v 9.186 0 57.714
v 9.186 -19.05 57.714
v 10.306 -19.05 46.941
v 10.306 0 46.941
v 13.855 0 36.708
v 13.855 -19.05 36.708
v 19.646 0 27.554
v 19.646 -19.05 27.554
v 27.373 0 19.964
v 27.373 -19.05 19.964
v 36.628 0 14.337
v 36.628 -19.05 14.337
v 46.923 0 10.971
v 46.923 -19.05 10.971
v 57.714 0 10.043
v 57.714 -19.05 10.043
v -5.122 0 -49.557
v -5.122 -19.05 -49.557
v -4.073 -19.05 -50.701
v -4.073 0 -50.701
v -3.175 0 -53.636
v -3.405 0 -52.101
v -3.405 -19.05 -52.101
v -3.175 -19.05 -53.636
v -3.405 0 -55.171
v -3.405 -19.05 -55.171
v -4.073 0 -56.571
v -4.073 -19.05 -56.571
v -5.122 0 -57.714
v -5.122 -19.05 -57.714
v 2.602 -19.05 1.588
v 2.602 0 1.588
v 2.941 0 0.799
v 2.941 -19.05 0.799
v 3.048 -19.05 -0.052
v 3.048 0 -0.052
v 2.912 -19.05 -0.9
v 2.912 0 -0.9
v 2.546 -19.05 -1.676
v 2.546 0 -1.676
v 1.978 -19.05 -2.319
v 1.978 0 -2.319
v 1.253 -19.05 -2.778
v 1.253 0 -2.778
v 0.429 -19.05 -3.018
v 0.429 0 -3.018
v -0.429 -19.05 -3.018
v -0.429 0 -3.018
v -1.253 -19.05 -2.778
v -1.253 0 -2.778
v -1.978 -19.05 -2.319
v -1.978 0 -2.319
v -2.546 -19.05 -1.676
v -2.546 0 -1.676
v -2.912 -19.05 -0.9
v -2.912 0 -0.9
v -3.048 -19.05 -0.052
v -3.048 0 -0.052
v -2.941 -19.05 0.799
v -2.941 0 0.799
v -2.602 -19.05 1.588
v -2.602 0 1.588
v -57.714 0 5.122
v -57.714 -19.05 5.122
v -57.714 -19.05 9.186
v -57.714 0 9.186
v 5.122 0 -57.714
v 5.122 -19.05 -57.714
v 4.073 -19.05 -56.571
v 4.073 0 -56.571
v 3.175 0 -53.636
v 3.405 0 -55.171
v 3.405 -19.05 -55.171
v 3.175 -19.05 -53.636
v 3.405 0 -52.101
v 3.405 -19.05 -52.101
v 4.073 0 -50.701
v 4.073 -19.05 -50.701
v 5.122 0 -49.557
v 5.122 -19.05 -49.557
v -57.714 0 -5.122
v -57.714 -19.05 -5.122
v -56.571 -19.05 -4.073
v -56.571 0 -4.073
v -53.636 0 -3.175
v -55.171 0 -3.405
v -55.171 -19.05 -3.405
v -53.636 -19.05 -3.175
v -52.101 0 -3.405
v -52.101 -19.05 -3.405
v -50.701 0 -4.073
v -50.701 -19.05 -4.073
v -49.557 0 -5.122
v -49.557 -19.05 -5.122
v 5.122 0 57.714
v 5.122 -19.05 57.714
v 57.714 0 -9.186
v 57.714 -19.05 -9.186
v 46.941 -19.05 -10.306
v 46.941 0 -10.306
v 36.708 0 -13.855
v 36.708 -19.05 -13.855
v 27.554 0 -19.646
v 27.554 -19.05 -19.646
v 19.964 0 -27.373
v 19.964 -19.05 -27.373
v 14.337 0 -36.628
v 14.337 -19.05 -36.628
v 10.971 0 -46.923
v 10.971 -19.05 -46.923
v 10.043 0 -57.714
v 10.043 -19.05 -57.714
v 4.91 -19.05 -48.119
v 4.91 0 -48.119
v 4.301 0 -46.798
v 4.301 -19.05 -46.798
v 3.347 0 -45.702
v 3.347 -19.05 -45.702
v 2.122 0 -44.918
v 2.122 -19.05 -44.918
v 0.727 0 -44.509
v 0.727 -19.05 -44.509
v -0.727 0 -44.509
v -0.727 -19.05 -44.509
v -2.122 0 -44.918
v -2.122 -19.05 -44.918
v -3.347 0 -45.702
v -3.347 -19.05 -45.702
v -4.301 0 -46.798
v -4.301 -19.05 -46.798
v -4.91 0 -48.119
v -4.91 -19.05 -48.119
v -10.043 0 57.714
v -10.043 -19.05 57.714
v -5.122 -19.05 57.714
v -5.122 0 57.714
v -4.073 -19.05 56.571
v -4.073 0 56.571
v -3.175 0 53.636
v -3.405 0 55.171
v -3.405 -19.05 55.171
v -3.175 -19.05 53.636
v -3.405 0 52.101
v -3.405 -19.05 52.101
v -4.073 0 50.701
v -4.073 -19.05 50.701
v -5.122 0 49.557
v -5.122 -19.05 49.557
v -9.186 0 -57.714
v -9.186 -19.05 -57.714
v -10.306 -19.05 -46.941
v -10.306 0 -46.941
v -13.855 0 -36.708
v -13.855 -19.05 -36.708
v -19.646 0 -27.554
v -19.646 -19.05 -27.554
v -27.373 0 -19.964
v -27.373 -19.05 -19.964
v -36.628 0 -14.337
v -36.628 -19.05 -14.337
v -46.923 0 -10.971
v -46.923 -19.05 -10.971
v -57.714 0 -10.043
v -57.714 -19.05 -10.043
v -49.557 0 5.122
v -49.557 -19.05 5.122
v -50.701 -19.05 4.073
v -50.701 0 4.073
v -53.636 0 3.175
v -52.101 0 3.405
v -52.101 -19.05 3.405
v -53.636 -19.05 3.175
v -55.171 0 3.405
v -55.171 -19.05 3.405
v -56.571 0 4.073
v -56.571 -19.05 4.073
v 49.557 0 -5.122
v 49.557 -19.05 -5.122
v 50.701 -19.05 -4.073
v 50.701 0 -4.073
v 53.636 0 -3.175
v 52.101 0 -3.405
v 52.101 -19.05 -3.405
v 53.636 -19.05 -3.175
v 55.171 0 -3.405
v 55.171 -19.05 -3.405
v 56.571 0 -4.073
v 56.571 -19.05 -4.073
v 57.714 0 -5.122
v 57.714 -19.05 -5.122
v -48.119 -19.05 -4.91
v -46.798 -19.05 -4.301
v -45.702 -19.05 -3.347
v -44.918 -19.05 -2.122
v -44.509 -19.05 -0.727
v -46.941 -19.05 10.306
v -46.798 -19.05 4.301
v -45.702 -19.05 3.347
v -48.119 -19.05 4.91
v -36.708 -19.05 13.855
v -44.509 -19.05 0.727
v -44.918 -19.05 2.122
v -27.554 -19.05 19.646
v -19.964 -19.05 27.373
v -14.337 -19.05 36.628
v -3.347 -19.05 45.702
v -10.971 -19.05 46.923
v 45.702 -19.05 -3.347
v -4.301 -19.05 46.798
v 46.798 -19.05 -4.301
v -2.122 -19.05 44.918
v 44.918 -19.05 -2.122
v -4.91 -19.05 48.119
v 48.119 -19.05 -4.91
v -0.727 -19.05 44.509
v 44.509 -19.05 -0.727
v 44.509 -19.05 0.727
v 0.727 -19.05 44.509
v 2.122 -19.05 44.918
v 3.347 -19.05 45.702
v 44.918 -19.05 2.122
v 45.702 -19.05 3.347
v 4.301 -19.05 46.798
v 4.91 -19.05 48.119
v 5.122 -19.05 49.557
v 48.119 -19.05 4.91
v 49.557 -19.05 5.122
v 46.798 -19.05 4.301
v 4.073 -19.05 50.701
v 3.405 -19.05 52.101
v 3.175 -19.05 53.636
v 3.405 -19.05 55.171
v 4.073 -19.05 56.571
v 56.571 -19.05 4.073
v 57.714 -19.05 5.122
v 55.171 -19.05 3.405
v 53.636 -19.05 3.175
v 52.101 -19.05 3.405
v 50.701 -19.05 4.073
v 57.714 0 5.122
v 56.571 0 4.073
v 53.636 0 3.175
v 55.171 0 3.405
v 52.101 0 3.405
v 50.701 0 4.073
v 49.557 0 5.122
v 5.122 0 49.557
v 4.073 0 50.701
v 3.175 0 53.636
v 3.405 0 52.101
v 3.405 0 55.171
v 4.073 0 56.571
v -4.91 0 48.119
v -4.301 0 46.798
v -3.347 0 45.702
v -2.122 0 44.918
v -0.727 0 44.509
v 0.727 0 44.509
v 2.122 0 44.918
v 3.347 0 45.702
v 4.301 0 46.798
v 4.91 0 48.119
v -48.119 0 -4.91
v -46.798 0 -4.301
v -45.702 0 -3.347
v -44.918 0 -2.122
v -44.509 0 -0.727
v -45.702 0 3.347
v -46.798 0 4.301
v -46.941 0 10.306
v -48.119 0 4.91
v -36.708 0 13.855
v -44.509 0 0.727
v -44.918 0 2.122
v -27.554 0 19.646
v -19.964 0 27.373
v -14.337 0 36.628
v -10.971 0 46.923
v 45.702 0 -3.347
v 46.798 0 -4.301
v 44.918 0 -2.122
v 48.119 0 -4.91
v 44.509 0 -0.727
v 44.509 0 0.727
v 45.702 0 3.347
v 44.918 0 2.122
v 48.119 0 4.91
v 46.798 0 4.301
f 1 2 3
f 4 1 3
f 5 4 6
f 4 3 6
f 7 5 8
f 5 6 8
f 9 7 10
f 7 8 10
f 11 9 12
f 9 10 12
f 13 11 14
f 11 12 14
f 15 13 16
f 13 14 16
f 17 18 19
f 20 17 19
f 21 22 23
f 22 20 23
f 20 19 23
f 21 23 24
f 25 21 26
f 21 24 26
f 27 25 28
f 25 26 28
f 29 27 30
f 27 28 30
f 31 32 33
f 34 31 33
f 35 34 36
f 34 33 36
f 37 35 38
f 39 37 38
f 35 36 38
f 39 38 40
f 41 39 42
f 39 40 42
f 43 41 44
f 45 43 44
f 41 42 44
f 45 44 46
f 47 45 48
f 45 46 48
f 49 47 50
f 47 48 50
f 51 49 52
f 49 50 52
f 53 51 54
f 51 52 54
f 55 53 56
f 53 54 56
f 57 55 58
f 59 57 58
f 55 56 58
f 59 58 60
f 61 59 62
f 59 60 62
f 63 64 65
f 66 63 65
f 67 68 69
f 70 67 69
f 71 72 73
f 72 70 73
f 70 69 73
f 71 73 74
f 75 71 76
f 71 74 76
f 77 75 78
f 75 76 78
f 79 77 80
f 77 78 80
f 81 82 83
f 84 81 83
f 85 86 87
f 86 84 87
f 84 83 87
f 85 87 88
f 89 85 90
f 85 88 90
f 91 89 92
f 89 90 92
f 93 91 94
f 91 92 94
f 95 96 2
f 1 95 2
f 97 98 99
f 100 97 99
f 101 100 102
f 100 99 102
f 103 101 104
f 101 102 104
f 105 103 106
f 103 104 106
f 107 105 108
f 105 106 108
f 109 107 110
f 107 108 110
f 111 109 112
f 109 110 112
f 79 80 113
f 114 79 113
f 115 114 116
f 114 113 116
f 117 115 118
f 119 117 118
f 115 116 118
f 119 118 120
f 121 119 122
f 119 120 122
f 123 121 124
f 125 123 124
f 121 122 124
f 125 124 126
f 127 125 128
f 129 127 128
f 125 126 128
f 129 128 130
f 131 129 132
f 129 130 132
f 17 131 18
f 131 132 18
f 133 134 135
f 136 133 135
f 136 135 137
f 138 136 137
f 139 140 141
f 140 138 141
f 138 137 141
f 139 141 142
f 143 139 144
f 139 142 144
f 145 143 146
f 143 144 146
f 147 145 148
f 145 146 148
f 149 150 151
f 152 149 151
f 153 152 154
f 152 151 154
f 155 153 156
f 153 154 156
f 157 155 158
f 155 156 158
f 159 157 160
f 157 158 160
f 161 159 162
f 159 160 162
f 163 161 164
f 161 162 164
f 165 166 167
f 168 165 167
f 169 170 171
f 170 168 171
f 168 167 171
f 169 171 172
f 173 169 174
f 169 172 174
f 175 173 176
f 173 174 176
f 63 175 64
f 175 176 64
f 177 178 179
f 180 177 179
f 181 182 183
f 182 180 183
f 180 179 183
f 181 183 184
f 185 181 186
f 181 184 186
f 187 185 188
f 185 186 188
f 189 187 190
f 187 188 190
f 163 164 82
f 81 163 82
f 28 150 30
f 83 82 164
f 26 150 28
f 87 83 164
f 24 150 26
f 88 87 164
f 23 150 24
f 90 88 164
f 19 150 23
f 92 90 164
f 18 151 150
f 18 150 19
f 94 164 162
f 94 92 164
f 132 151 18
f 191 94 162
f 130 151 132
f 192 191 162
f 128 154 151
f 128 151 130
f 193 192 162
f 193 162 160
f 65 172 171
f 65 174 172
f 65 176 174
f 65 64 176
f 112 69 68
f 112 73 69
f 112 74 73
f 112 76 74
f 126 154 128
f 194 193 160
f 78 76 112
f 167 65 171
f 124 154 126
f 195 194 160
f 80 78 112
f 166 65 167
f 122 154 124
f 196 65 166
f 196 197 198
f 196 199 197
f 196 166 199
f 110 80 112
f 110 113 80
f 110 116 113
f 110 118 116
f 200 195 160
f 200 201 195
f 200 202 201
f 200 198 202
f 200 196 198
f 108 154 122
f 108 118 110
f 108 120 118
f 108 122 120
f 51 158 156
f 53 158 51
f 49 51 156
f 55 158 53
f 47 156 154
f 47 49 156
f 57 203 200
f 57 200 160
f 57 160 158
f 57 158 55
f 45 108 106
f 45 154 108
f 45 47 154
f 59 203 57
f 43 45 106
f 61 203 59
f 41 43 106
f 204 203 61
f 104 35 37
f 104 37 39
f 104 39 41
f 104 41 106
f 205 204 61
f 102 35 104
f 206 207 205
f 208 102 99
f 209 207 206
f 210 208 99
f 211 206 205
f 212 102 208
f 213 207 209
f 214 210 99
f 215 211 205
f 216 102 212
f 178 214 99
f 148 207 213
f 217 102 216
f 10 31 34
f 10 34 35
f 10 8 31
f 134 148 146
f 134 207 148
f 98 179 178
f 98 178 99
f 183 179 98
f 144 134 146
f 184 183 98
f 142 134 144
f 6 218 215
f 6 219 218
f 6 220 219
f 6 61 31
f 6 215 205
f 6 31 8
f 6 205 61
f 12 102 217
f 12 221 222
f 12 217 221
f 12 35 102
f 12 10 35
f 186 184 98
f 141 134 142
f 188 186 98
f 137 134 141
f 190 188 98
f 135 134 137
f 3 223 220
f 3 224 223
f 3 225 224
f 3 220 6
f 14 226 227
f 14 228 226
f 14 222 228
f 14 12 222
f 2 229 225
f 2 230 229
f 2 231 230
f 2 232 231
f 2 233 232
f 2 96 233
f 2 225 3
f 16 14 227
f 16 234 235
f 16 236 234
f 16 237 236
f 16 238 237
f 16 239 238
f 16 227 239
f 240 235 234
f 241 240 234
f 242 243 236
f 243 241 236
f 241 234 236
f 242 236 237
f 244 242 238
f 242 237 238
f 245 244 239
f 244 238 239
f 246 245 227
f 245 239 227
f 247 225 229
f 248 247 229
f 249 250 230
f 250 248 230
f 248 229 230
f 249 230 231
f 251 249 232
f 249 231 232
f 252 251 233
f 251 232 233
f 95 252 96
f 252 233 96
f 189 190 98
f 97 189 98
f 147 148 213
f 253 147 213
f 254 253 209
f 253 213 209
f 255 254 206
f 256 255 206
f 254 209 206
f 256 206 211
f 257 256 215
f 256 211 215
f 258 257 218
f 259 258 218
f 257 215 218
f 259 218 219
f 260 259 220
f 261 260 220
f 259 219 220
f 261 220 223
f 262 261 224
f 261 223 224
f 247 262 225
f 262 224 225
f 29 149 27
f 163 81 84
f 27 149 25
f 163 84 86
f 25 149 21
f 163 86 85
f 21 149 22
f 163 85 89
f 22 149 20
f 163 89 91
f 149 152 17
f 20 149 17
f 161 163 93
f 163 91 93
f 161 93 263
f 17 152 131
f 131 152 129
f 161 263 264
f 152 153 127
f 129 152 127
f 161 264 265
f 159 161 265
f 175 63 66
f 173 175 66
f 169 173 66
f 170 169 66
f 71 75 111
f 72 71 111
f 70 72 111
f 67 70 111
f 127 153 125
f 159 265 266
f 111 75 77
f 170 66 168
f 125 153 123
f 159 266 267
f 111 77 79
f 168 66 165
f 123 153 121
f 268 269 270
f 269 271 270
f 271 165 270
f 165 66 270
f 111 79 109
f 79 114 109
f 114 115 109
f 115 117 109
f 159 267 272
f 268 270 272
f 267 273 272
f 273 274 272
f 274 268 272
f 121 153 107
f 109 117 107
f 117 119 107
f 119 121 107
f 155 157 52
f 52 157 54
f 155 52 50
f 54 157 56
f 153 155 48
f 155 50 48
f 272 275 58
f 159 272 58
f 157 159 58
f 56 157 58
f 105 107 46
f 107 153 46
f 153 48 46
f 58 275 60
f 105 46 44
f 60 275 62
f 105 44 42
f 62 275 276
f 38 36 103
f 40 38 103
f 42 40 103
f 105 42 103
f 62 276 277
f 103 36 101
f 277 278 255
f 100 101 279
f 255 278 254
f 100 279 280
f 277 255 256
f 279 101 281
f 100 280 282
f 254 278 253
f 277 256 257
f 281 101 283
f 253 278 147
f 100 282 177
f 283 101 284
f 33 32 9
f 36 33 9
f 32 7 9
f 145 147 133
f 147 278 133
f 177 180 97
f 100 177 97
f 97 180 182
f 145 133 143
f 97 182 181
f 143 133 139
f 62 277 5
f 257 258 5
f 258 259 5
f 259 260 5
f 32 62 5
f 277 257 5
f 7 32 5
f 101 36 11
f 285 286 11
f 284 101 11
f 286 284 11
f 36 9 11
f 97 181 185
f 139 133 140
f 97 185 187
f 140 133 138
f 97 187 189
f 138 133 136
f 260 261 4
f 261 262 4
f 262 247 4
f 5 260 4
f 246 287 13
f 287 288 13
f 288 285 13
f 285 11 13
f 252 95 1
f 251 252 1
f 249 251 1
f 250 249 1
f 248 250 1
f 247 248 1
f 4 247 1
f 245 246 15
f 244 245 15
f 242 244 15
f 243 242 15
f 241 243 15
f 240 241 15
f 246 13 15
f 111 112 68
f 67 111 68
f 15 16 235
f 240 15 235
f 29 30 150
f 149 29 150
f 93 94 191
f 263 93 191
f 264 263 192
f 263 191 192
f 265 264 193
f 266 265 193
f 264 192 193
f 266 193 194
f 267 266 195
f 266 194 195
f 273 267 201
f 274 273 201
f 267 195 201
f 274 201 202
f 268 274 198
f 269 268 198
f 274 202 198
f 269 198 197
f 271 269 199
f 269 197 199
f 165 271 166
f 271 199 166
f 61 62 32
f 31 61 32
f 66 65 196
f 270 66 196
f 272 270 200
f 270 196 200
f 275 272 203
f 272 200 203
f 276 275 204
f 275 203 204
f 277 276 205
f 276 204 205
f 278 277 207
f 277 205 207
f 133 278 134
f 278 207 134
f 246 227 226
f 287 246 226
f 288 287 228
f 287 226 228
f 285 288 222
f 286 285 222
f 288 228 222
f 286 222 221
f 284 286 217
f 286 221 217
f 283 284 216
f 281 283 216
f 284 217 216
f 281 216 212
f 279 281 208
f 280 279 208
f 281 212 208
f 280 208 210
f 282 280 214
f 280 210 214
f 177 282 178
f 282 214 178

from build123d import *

# Parameters (mm, degrees)
F1_DEPTH = 19.05
F4_DEPTH = 19.051
F6_DEPTH = 19.051
F7_DEPTH = 19.051


with BuildPart() as f1:
    # F0 (on Front) → F1 (new body)
    with BuildSketch(Plane.XZ):
        with BuildLine():
            ThreePointArc((7.08977, 74.735215), (-4.612113, 72.936745), (-10.446423, 62.634833))
            ThreePointArc((-10.446423, 62.634833), (-45.232522, 44.567577), (-62.782662, 9.51774))
            ThreePointArc((-62.782662, 9.51774), (-63.498259, -0.470187), (-62.634833, -10.446423))
            ThreePointArc((-62.634833, -10.446423), (-44.567577, -45.232522), (-9.51774, -62.782662))
            ThreePointArc((-9.51774, -62.782662), (0.470187, -63.498259), (10.446423, -62.634833))
            ThreePointArc((10.446423, -62.634833), (45.232522, -44.567577), (62.782662, -9.51774))
            ThreePointArc((62.782662, -9.51774), (63.498259, 0.470187), (62.634833, 10.446423))
            ThreePointArc((62.634833, 10.446423), (44.567577, 45.232522), (9.51774, 62.782662))
            ThreePointArc((9.51774, 62.782662), (4.127105, 67.910519), (7.08977, 74.735215))
        make_face()
        with BuildLine():
            ThreePointArc((-62.634833, -10.446423), (-63.498259, -0.470187), (-62.782662, 9.51774))
            ThreePointArc((-62.782662, 9.51774), (-67.910519, 4.127105), (-74.735215, 7.08977))
            ThreePointArc((-74.735215, 7.08977), (-72.936745, -4.612113), (-62.634833, -10.446423))
        make_face()
        with BuildLine():
            ThreePointArc((74.735215, -7.08977), (72.936745, 4.612113), (62.634833, 10.446423))
            ThreePointArc((62.634833, 10.446423), (63.498259, 0.470187), (62.782662, -9.51774))
            ThreePointArc((62.782662, -9.51774), (67.910519, -4.127105), (74.735215, -7.08977))
        make_face()
        with BuildLine():
            ThreePointArc((10.446423, -62.634833), (0.470187, -63.498259), (-9.51774, -62.782662))
            ThreePointArc((-9.51774, -62.782662), (-4.127105, -67.910519), (-7.08977, -74.735215))
            ThreePointArc((-7.08977, -74.735215), (4.612113, -72.936745), (10.446423, -62.634833))
        make_face()
    extrude(amount=F1_DEPTH)

    # F3 (on face) → F4 (cut, through all)
    with BuildSketch(Plane.XZ.offset(19.05)):
        with BuildLine():
            Line((39.873943, 79.150751), (9.51774, 62.782662))
            ThreePointArc((9.51774, 62.782662), (23.239874, 23.586611), (62.634833, 10.446423))
            Line((62.634833, 10.446423), (86.088315, 35.227999))
            Line((86.088315, 35.227999), (39.873943, 79.150751))
        make_face()
        with BuildLine():
            Line((-79.150751, 39.873943), (-62.782662, 9.51774))
            ThreePointArc((-62.782662, 9.51774), (-23.586611, 23.239874), (-10.446423, 62.634833))
            Line((-10.446423, 62.634833), (-35.227999, 86.088315))
            Line((-35.227999, 86.088315), (-79.150751, 39.873943))
        make_face()
        with BuildLine():
            Line((-39.873943, -79.150751), (-9.51774, -62.782662))
            ThreePointArc((-9.51774, -62.782662), (-23.239874, -23.586611), (-62.634833, -10.446423))
            Line((-62.634833, -10.446423), (-86.088315, -35.227999))
            Line((-86.088315, -35.227999), (-39.873943, -79.150751))
        make_face()
        with BuildLine():
            Line((79.150751, -39.873943), (62.782662, -9.51774))
            ThreePointArc((62.782662, -9.51774), (23.586611, -23.239874), (10.446423, -62.634833))
            Line((10.446423, -62.634833), (35.227999, -86.088315))
            Line((35.227999, -86.088315), (79.150751, -39.873943))
        make_face()
    extrude(amount=-F4_DEPTH, mode=Mode.SUBTRACT)

    # F5 (on face) → F6 (cut, through all)
    with BuildSketch(Plane.XZ.offset(19.05)):
        with BuildLine():
            ThreePointArc((-5.122292, 49.557197), (0, 44.457518), (5.122292, 49.557197))
            ThreePointArc((5.122292, 49.557197), (3.175, 53.635843), (5.122292, 57.714488))
            Line((5.122292, 57.714488), (9.185783, 57.714488))
            ThreePointArc((9.185783, 57.714488), (9.283466, 60.253048), (9.51774, 62.782662))
            ThreePointArc((9.51774, 62.782662), (4.127105, 67.910519), (7.08977, 74.735215))
            ThreePointArc((7.08977, 74.735215), (-4.612113, 72.936745), (-10.446423, 62.634833))
            ThreePointArc((-10.446423, 62.634833), (-10.180474, 60.179939), (-10.043413, 57.714488))
            Line((-10.043413, 57.714488), (-5.122292, 57.714488))
            ThreePointArc((-5.122292, 57.714488), (-3.175, 53.635843), (-5.122292, 49.557197))
        make_face()
        with BuildLine():
            Line((-57.714488, 5.122292), (-57.714488, 9.185783))
            ThreePointArc((-57.714488, 9.185783), (-60.253048, 9.283466), (-62.782662, 9.51774))
            ThreePointArc((-62.782662, 9.51774), (-67.910519, 4.127105), (-74.735215, 7.08977))
            ThreePointArc((-74.735215, 7.08977), (-72.936745, -4.612113), (-62.634833, -10.446423))
            ThreePointArc((-62.634833, -10.446423), (-60.179939, -10.180474), (-57.714488, -10.043413))
            Line((-57.714488, -10.043413), (-57.714488, -5.122292))
            ThreePointArc((-57.714488, -5.122292), (-53.635843, -3.175), (-49.557197, -5.122292))
            ThreePointArc((-49.557197, -5.122292), (-44.457518, 0), (-49.557197, 5.122292))
            ThreePointArc((-49.557197, 5.122292), (-53.635843, 3.175), (-57.714488, 5.122292))
        make_face()
        with BuildLine():
            ThreePointArc((10.446423, -62.634833), (10.180474, -60.179939), (10.043413, -57.714488))
            Line((10.043413, -57.714488), (5.122292, -57.714488))
            ThreePointArc((5.122292, -57.714488), (3.175, -53.635843), (5.122292, -49.557197))
            ThreePointArc((5.122292, -49.557197), (0, -44.457518), (-5.122292, -49.557197))
            ThreePointArc((-5.122292, -49.557197), (-3.175, -53.635843), (-5.122292, -57.714488))
            Line((-5.122292, -57.714488), (-9.185783, -57.714488))
            ThreePointArc((-9.185783, -57.714488), (-9.283466, -60.253048), (-9.51774, -62.782662))
            ThreePointArc((-9.51774, -62.782662), (-4.127105, -67.910519), (-7.08977, -74.735215))
            ThreePointArc((-7.08977, -74.735215), (4.612113, -72.936745), (10.446423, -62.634833))
        make_face()
        with BuildLine():
            ThreePointArc((62.634833, 10.446423), (60.179939, 10.180474), (57.714488, 10.043413))
            Line((57.714488, 10.043413), (57.714488, 5.122292))
            ThreePointArc((57.714488, 5.122292), (53.635843, 3.175), (49.557197, 5.122292))
            ThreePointArc((49.557197, 5.122292), (44.457518, 0), (49.557197, -5.122292))
            ThreePointArc((49.557197, -5.122292), (53.635843, -3.175), (57.714488, -5.122292))
            Line((57.714488, -5.122292), (57.714488, -9.185783))
            ThreePointArc((57.714488, -9.185783), (60.253048, -9.283466), (62.782662, -9.51774))
            ThreePointArc((62.782662, -9.51774), (67.910519, -4.127105), (74.735215, -7.08977))
            ThreePointArc((74.735215, -7.08977), (72.936745, 4.612113), (62.634833, 10.446423))
        make_face()
    extrude(amount=-F6_DEPTH, mode=Mode.SUBTRACT)

    # F2 (on face) → F7 (cut, through all)
    with BuildSketch(Plane(origin=(0, 0, 0), x_dir=(-1, 0, 0), z_dir=(0, 1, 0))):
        with BuildLine():
            Line((-1.5875, 1.5875), (-2.601951, 1.5875))
            ThreePointArc((-2.601951, 1.5875), (0, -3.048), (2.601951, 1.5875))
            Line((2.601951, 1.5875), (-1.5875, 1.5875))
        make_face()
    extrude(amount=-F7_DEPTH, mode=Mode.SUBTRACT)


solid = f1.part
